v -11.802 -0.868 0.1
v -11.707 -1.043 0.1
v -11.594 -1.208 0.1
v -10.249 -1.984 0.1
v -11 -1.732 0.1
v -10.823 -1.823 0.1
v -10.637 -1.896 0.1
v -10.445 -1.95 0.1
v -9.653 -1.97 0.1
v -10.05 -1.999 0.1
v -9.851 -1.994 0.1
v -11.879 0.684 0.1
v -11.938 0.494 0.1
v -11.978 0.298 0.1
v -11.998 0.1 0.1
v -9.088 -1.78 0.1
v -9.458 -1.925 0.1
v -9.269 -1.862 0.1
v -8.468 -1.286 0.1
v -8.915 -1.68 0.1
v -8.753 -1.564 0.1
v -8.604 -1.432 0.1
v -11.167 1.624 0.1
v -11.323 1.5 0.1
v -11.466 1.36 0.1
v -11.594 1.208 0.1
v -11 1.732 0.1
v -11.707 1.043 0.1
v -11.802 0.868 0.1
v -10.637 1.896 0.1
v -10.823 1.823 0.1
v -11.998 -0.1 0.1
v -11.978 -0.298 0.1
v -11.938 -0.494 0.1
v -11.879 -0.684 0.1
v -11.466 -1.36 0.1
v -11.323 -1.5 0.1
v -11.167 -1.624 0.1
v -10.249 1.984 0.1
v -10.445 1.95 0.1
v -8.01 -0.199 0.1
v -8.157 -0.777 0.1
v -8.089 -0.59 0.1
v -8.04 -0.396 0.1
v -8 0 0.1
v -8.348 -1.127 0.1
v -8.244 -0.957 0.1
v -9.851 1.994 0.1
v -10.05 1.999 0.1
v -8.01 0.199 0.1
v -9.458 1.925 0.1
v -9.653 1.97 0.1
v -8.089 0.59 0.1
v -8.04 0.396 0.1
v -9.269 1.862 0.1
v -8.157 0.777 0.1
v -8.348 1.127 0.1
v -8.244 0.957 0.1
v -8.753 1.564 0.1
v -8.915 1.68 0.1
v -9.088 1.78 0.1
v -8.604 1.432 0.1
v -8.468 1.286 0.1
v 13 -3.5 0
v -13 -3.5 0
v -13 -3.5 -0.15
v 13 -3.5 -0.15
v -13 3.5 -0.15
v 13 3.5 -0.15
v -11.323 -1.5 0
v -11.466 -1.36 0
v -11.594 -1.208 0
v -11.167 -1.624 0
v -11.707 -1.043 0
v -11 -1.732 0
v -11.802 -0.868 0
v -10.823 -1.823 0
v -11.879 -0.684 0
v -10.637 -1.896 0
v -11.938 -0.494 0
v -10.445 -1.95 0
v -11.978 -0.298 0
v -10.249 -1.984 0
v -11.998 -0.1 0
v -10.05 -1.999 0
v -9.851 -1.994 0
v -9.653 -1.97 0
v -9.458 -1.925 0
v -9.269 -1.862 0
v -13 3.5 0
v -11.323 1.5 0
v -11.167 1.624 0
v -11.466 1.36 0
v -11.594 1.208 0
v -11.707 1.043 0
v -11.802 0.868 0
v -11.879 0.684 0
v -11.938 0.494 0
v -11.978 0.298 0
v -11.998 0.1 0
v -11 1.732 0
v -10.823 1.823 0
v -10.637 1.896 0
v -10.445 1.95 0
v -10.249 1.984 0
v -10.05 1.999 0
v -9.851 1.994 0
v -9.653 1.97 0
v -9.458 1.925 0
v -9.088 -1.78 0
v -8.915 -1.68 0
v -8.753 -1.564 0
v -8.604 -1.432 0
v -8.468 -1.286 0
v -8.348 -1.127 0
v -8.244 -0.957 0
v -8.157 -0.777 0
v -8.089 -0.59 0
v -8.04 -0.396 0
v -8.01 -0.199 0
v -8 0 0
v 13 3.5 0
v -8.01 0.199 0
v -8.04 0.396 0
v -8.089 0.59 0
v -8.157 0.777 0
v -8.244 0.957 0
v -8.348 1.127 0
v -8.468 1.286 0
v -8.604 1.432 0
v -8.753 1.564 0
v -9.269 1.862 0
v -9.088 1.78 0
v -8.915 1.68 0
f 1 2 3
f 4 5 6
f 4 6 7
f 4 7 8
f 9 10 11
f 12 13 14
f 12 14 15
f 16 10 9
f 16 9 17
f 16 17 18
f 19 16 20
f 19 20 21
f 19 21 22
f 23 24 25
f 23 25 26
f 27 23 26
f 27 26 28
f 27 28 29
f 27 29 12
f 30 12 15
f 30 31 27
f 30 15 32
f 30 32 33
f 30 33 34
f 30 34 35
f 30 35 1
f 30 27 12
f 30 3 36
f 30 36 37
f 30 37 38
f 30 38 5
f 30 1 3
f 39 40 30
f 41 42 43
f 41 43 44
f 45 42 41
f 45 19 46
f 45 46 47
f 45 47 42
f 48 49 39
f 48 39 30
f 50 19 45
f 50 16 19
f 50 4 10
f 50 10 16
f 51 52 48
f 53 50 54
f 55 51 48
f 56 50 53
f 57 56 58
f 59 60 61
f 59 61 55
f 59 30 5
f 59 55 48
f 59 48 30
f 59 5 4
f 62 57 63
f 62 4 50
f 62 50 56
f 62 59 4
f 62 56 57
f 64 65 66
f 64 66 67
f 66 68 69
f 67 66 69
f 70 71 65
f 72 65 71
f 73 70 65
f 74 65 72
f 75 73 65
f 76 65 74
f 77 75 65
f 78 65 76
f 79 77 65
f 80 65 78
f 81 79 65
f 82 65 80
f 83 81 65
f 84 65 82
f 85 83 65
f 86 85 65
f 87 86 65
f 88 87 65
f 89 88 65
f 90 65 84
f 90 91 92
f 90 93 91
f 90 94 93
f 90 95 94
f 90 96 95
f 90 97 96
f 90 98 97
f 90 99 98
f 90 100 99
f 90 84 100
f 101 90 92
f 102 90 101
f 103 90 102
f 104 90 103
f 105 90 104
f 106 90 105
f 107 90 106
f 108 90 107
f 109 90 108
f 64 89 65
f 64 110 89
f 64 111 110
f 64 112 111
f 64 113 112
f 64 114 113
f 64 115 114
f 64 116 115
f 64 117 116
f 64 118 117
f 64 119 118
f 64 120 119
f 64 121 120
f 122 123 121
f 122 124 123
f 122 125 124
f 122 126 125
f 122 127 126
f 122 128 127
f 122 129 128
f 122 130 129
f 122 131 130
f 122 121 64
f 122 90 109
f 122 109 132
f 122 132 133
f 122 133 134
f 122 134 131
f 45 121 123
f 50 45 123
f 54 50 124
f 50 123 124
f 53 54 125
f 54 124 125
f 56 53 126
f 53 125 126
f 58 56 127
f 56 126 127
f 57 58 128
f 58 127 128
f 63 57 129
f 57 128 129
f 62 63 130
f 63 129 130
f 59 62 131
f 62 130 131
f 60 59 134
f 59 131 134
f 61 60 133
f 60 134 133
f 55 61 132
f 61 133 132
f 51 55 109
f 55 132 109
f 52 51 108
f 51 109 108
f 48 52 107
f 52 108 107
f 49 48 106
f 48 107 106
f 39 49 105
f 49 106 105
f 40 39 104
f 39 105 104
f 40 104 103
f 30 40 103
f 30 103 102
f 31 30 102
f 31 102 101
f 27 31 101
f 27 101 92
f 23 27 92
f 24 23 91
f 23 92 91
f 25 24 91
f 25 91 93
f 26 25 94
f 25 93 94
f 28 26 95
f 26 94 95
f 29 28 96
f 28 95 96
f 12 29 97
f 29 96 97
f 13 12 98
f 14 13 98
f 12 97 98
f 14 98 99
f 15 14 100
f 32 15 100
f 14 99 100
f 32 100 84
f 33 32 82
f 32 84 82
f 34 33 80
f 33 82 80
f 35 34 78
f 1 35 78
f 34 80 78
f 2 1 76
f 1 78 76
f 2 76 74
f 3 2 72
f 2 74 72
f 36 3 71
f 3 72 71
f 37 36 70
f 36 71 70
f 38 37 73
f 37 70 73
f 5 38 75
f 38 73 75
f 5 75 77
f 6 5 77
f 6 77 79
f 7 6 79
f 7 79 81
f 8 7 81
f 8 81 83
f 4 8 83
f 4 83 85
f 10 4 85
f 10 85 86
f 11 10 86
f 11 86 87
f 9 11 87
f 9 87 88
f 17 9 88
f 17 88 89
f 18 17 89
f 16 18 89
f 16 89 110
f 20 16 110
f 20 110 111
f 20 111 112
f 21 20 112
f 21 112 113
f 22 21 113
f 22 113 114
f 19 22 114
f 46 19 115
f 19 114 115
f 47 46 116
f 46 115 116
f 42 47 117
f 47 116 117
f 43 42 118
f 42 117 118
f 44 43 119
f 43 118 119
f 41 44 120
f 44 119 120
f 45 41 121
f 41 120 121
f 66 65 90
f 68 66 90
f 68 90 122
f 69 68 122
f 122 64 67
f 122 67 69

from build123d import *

# Parameters (mm, degrees)
F0_W     = 26
F0_H     = 7
F2_DEPTH = 0.15
F1_R     = 2
F3_DEPTH = 0.1


with BuildPart() as f2:
    # F0 (on Top) → F2 (new body)
    with BuildSketch(Plane.XY):
        Rectangle(F0_W, F0_H)
    extrude(amount=-F2_DEPTH)

    # F1 (on Top) → F3 (join)
    with BuildSketch(Plane.XY):
        with Locations((-10, 0)):
            Circle(F1_R)
    extrude(amount=F3_DEPTH)


solid = f2.part
